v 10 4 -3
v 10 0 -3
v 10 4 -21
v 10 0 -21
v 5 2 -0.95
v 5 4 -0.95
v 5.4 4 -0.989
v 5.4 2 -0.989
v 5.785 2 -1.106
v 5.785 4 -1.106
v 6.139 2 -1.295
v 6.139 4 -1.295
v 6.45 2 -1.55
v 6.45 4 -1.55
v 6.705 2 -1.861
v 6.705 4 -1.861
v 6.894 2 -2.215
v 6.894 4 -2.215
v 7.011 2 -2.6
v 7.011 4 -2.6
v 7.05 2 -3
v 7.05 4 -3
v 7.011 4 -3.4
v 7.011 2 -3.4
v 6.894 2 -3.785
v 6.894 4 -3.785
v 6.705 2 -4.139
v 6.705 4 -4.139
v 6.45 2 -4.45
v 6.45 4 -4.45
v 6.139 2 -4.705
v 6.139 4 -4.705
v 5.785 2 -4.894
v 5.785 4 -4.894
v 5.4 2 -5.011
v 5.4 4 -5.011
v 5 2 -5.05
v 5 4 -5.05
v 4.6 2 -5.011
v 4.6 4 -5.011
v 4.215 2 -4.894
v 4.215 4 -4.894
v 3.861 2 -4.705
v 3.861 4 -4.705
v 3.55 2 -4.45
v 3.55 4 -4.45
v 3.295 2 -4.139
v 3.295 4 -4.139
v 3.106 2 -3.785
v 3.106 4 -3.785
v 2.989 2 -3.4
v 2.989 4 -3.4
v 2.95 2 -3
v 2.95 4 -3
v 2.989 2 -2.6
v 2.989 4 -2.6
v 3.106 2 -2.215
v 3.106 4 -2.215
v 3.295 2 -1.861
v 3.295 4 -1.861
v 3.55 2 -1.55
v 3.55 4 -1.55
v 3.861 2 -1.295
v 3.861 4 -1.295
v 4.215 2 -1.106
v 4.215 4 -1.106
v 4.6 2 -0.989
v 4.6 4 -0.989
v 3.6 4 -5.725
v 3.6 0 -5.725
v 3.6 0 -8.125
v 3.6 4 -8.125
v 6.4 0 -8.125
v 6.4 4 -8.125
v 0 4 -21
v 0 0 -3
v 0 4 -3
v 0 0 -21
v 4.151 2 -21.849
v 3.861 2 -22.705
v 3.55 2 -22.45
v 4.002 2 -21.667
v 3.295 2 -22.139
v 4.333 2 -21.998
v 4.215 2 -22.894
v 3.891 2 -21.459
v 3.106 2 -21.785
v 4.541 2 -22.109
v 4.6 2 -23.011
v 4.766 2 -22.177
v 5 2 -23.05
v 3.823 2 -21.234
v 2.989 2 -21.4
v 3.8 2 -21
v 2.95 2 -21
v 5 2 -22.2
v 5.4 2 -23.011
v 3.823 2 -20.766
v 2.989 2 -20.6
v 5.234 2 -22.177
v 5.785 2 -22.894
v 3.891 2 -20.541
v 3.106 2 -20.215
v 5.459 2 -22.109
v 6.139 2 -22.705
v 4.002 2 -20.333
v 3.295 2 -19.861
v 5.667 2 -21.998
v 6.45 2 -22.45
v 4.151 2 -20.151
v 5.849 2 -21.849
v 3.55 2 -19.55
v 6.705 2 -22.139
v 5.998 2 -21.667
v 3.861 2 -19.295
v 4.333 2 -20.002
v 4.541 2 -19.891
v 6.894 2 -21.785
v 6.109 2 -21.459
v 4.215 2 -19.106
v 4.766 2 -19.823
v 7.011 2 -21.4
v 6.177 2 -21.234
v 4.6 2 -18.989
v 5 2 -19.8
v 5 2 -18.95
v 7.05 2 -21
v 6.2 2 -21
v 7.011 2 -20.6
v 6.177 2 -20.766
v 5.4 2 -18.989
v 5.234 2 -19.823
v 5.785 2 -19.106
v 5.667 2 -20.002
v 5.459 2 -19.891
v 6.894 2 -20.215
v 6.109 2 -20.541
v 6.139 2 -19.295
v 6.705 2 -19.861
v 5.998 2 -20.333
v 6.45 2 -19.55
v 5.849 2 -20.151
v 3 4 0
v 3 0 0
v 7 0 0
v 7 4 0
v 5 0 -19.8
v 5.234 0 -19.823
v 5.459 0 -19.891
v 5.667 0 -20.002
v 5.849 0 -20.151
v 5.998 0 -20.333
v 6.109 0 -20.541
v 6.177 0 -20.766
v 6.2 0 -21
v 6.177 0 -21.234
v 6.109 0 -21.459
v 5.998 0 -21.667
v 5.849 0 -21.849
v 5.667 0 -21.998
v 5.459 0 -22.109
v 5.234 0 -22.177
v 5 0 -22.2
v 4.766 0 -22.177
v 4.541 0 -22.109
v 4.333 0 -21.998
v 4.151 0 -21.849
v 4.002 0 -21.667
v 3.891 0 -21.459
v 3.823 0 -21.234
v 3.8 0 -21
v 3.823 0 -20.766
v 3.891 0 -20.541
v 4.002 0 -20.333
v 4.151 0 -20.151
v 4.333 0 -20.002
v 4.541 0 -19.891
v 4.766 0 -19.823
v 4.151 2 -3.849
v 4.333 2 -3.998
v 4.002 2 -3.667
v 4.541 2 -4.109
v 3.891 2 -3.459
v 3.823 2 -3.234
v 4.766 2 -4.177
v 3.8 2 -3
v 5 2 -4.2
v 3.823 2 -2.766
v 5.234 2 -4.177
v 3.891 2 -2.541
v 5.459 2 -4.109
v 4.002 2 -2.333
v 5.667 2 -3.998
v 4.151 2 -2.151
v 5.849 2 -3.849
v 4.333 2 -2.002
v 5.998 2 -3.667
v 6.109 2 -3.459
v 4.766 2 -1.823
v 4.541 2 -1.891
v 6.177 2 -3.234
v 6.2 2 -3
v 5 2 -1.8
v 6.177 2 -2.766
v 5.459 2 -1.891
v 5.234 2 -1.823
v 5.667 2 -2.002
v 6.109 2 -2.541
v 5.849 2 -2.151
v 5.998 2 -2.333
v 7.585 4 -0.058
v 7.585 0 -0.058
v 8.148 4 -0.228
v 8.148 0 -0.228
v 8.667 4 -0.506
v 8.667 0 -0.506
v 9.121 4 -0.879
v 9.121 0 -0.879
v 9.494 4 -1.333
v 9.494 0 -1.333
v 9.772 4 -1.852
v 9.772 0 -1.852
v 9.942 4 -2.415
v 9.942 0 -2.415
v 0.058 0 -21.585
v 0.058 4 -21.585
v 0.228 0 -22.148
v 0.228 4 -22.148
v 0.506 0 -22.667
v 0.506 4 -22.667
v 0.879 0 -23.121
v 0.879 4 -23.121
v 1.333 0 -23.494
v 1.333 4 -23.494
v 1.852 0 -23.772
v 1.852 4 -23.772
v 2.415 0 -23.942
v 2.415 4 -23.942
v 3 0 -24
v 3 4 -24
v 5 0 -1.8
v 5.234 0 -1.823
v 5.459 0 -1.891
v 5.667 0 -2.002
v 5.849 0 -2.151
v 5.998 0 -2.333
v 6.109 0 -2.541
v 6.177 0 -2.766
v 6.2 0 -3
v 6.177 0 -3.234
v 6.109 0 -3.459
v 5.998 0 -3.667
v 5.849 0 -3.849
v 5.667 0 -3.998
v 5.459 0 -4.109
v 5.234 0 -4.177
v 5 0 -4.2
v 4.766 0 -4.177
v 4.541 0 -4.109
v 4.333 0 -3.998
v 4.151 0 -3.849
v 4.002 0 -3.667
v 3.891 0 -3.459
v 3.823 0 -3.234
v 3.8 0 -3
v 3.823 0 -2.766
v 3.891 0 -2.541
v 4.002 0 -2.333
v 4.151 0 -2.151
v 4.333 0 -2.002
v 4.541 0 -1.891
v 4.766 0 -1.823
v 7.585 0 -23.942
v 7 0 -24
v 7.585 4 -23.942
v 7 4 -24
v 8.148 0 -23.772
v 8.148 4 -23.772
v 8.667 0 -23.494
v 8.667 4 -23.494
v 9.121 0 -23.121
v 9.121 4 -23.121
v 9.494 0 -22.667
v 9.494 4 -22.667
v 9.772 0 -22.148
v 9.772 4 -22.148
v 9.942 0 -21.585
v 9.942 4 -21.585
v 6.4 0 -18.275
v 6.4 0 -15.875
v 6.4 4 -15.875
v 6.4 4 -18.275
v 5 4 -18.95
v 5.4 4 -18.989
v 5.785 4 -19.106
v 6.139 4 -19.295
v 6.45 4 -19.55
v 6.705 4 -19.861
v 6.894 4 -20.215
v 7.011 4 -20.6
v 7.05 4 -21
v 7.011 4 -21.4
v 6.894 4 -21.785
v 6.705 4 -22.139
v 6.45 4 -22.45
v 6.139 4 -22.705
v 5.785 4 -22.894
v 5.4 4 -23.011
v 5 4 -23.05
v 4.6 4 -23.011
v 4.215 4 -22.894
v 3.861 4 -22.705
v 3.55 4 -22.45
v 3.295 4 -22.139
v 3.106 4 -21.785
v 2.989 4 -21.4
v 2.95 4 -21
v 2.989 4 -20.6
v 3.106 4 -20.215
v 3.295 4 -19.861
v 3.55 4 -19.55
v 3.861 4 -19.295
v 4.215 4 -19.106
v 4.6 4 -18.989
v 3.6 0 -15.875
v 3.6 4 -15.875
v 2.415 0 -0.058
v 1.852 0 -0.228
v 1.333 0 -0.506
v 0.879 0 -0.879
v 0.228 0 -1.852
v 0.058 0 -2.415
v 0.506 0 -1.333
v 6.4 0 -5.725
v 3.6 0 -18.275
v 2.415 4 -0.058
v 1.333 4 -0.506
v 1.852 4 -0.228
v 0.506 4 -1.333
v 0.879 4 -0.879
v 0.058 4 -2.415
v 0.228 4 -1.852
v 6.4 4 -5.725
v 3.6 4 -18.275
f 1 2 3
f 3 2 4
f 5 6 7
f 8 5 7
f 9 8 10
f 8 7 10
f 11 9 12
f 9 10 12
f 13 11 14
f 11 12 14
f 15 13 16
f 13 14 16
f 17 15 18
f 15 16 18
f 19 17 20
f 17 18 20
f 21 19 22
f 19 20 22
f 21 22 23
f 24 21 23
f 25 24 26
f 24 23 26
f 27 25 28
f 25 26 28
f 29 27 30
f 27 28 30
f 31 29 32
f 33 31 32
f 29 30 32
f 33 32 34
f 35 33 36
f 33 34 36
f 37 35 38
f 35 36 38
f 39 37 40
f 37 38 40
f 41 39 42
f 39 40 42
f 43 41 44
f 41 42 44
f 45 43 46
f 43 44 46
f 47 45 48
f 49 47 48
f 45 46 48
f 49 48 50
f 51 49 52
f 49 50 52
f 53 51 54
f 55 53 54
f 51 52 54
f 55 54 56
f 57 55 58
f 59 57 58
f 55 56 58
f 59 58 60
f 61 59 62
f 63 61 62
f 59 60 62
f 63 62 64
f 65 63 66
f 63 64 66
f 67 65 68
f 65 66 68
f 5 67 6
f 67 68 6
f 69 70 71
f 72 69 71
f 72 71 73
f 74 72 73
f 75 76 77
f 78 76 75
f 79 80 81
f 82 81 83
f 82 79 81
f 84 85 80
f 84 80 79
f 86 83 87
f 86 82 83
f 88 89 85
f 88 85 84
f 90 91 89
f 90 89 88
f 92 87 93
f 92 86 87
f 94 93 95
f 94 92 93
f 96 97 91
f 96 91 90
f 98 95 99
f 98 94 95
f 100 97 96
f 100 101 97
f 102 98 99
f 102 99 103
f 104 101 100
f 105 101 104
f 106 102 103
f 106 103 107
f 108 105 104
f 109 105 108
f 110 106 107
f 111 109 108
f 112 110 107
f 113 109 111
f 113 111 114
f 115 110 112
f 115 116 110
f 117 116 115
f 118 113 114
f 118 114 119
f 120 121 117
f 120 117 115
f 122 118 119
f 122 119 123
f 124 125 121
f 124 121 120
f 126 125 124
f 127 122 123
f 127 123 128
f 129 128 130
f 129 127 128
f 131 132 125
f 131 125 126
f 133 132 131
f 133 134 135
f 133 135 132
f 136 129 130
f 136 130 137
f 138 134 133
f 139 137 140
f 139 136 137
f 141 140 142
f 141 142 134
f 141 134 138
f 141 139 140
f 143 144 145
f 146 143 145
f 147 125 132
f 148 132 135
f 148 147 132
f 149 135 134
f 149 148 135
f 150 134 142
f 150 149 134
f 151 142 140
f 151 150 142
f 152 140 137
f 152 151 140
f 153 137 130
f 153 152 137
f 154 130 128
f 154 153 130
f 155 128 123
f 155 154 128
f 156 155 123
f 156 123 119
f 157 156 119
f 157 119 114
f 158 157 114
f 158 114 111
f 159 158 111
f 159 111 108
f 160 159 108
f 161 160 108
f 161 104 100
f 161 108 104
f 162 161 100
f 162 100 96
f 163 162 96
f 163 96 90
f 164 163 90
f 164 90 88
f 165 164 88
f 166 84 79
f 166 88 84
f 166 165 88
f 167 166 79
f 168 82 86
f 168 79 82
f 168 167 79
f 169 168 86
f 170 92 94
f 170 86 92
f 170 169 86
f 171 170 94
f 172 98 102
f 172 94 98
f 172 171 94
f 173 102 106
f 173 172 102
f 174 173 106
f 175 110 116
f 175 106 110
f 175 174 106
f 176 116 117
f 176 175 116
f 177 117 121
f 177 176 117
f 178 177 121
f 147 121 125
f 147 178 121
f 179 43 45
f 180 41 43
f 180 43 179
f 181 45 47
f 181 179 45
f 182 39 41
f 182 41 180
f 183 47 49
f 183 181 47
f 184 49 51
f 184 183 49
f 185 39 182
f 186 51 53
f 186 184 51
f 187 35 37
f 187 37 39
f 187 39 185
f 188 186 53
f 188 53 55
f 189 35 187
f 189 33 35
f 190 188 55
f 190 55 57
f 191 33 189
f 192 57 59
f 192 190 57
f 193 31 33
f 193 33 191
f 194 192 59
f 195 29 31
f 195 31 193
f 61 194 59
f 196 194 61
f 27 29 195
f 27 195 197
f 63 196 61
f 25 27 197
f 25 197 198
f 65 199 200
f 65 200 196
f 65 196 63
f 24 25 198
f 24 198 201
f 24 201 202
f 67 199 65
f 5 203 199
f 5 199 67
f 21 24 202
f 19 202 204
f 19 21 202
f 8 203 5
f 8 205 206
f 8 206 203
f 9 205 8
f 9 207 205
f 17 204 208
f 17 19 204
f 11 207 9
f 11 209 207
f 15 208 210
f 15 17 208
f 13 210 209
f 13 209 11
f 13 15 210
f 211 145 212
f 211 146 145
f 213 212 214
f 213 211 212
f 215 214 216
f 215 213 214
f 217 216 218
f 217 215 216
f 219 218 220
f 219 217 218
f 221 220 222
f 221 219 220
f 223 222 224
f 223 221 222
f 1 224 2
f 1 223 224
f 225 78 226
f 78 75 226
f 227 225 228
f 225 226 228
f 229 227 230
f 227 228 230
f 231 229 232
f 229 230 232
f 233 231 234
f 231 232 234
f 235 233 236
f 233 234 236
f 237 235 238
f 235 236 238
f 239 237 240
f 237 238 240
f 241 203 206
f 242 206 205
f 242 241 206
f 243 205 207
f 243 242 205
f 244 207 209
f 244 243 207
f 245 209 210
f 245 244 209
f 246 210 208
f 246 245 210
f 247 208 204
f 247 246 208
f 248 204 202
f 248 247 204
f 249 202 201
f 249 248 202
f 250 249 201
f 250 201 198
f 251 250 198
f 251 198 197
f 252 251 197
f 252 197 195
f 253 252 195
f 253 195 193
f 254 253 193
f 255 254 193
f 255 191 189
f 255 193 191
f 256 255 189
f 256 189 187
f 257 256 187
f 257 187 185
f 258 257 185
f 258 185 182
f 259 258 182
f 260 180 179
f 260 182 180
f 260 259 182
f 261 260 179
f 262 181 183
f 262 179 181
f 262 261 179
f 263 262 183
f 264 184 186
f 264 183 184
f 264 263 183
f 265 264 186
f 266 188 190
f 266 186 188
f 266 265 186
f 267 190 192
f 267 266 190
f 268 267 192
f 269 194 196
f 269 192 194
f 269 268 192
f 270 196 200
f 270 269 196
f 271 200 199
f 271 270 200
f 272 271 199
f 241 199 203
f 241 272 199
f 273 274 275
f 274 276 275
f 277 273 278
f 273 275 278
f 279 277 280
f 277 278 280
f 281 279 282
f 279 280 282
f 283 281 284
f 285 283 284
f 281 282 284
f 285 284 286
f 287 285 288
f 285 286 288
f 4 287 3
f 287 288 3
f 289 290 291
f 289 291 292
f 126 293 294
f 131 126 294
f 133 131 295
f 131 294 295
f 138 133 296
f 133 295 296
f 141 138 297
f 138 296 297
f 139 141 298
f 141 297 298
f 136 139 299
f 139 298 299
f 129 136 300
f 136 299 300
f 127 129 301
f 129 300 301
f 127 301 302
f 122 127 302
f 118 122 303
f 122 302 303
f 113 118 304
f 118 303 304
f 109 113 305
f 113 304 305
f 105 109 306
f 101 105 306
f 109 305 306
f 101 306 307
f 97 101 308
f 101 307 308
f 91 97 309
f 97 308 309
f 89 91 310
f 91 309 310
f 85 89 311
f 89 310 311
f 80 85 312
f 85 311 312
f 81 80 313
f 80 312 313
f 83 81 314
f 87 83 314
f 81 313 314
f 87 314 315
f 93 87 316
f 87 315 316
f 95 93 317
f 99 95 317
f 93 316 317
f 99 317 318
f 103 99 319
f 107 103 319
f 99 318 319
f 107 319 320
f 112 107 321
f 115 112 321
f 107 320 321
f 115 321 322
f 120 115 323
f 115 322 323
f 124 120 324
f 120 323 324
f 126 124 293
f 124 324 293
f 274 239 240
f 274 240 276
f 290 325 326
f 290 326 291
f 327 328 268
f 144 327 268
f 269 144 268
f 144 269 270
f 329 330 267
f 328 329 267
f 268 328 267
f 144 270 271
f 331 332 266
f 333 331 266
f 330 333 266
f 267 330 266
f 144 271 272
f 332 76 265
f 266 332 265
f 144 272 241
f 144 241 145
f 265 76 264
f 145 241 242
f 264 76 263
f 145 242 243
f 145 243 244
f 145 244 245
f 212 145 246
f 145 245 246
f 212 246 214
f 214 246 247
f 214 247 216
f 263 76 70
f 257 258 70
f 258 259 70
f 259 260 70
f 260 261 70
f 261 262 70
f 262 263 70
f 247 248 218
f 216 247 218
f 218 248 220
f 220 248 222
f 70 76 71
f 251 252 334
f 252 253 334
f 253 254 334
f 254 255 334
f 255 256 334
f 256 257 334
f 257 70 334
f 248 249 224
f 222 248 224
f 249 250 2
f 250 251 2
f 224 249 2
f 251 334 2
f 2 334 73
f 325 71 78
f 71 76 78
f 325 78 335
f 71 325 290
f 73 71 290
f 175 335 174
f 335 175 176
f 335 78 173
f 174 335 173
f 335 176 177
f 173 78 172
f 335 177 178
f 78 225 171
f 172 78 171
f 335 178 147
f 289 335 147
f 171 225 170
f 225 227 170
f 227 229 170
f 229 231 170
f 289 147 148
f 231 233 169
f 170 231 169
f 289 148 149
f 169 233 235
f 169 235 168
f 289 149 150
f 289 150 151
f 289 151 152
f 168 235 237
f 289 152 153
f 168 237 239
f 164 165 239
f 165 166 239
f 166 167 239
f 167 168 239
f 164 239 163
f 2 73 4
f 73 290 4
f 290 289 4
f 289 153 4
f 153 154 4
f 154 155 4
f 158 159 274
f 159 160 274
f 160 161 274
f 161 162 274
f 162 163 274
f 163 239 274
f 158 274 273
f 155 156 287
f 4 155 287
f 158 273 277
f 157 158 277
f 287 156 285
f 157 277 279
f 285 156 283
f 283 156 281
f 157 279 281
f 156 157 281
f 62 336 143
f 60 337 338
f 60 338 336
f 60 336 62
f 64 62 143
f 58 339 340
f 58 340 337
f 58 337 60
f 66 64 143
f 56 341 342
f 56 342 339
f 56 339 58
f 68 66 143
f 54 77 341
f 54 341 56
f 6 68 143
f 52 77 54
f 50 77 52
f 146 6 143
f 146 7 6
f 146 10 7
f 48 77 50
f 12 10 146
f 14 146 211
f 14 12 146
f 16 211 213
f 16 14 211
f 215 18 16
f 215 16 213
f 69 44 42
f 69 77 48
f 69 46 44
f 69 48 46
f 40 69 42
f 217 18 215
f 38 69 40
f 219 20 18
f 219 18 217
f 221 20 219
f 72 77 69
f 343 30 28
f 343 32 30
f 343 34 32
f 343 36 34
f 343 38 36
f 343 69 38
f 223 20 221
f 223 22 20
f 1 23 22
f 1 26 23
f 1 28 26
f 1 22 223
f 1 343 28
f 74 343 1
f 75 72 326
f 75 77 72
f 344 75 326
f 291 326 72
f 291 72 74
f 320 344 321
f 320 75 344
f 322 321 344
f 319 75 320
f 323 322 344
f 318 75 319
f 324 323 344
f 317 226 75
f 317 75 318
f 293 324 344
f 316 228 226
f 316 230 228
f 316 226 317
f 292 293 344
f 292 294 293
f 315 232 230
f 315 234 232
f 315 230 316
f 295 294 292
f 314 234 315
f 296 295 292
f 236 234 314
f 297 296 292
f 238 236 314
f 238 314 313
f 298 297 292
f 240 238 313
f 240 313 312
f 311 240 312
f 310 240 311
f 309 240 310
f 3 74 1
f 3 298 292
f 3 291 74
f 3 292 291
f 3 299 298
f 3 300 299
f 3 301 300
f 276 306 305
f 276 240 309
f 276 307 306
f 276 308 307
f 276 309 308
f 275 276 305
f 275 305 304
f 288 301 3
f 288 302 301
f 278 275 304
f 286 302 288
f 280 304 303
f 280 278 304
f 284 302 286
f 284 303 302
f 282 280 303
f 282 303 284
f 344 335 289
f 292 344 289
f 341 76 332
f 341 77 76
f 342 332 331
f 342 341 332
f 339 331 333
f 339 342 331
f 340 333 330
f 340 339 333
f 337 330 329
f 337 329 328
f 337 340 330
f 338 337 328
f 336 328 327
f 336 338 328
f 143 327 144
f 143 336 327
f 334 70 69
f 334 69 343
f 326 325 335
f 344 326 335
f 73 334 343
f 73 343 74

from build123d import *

# Parameters (mm, degrees)
SKETCH1_W           = 10
SKETCH1_H           = 24
SKETCH1_R           = 1.2
SKETCH1_W_2         = 2.8
SKETCH1_H_2         = 2.4
BOSS_EXTRUDE1_DEPTH = 4
FILLET1_R           = 3
SKETCH2_R           = 2.05
CUT_EXTRUDE1_DEPTH  = 2


with BuildPart() as part:
    # Sketch1 → Boss-Extrude1 (new body)
    with BuildSketch(Plane(origin=(0, 0, 0), x_dir=(1, 0, 0), z_dir=(0, 1, 0))):
        with Locations((5, 12)):
            Rectangle(SKETCH1_W, SKETCH1_H)
        with Locations(Location((5, 21, 0), (0, 0, 270))):
            Circle(SKETCH1_R, mode=Mode.SUBTRACT)
        with Locations(Location((5, 3, 0), (0, 0, 270))):
            Circle(SKETCH1_R, mode=Mode.SUBTRACT)
        with Locations((5, 17.075)):
            Rectangle(SKETCH1_W_2, SKETCH1_H_2, mode=Mode.SUBTRACT)
        with Locations((5, 6.925)):
            Rectangle(SKETCH1_W_2, SKETCH1_H_2, mode=Mode.SUBTRACT)
    extrude(amount=BOSS_EXTRUDE1_DEPTH)

    # Fillet1
    fillet1_edges = [part.edges().sort_by_distance(p)[0] for p in [
        (0, 2, -24),
        (10, 2, -24),
        (10, 2, 0),
        (0, 2, 0),
    ]]
    fillet(fillet1_edges, radius=FILLET1_R)

    # Sketch2 → Cut-Extrude1 (cut)
    with BuildSketch(Plane(origin=(0, 4, 0), x_dir=(1, 0, 0), z_dir=(0, 1, 0))):
        with Locations(Location((5, 3, 0), (0, 0, 270))):
            Circle(SKETCH2_R)
        with Locations(Location((5, 21, 0), (0, 0, 270))):
            Circle(SKETCH2_R)
    extrude(amount=-CUT_EXTRUDE1_DEPTH, mode=Mode.SUBTRACT)


solid = part.part
